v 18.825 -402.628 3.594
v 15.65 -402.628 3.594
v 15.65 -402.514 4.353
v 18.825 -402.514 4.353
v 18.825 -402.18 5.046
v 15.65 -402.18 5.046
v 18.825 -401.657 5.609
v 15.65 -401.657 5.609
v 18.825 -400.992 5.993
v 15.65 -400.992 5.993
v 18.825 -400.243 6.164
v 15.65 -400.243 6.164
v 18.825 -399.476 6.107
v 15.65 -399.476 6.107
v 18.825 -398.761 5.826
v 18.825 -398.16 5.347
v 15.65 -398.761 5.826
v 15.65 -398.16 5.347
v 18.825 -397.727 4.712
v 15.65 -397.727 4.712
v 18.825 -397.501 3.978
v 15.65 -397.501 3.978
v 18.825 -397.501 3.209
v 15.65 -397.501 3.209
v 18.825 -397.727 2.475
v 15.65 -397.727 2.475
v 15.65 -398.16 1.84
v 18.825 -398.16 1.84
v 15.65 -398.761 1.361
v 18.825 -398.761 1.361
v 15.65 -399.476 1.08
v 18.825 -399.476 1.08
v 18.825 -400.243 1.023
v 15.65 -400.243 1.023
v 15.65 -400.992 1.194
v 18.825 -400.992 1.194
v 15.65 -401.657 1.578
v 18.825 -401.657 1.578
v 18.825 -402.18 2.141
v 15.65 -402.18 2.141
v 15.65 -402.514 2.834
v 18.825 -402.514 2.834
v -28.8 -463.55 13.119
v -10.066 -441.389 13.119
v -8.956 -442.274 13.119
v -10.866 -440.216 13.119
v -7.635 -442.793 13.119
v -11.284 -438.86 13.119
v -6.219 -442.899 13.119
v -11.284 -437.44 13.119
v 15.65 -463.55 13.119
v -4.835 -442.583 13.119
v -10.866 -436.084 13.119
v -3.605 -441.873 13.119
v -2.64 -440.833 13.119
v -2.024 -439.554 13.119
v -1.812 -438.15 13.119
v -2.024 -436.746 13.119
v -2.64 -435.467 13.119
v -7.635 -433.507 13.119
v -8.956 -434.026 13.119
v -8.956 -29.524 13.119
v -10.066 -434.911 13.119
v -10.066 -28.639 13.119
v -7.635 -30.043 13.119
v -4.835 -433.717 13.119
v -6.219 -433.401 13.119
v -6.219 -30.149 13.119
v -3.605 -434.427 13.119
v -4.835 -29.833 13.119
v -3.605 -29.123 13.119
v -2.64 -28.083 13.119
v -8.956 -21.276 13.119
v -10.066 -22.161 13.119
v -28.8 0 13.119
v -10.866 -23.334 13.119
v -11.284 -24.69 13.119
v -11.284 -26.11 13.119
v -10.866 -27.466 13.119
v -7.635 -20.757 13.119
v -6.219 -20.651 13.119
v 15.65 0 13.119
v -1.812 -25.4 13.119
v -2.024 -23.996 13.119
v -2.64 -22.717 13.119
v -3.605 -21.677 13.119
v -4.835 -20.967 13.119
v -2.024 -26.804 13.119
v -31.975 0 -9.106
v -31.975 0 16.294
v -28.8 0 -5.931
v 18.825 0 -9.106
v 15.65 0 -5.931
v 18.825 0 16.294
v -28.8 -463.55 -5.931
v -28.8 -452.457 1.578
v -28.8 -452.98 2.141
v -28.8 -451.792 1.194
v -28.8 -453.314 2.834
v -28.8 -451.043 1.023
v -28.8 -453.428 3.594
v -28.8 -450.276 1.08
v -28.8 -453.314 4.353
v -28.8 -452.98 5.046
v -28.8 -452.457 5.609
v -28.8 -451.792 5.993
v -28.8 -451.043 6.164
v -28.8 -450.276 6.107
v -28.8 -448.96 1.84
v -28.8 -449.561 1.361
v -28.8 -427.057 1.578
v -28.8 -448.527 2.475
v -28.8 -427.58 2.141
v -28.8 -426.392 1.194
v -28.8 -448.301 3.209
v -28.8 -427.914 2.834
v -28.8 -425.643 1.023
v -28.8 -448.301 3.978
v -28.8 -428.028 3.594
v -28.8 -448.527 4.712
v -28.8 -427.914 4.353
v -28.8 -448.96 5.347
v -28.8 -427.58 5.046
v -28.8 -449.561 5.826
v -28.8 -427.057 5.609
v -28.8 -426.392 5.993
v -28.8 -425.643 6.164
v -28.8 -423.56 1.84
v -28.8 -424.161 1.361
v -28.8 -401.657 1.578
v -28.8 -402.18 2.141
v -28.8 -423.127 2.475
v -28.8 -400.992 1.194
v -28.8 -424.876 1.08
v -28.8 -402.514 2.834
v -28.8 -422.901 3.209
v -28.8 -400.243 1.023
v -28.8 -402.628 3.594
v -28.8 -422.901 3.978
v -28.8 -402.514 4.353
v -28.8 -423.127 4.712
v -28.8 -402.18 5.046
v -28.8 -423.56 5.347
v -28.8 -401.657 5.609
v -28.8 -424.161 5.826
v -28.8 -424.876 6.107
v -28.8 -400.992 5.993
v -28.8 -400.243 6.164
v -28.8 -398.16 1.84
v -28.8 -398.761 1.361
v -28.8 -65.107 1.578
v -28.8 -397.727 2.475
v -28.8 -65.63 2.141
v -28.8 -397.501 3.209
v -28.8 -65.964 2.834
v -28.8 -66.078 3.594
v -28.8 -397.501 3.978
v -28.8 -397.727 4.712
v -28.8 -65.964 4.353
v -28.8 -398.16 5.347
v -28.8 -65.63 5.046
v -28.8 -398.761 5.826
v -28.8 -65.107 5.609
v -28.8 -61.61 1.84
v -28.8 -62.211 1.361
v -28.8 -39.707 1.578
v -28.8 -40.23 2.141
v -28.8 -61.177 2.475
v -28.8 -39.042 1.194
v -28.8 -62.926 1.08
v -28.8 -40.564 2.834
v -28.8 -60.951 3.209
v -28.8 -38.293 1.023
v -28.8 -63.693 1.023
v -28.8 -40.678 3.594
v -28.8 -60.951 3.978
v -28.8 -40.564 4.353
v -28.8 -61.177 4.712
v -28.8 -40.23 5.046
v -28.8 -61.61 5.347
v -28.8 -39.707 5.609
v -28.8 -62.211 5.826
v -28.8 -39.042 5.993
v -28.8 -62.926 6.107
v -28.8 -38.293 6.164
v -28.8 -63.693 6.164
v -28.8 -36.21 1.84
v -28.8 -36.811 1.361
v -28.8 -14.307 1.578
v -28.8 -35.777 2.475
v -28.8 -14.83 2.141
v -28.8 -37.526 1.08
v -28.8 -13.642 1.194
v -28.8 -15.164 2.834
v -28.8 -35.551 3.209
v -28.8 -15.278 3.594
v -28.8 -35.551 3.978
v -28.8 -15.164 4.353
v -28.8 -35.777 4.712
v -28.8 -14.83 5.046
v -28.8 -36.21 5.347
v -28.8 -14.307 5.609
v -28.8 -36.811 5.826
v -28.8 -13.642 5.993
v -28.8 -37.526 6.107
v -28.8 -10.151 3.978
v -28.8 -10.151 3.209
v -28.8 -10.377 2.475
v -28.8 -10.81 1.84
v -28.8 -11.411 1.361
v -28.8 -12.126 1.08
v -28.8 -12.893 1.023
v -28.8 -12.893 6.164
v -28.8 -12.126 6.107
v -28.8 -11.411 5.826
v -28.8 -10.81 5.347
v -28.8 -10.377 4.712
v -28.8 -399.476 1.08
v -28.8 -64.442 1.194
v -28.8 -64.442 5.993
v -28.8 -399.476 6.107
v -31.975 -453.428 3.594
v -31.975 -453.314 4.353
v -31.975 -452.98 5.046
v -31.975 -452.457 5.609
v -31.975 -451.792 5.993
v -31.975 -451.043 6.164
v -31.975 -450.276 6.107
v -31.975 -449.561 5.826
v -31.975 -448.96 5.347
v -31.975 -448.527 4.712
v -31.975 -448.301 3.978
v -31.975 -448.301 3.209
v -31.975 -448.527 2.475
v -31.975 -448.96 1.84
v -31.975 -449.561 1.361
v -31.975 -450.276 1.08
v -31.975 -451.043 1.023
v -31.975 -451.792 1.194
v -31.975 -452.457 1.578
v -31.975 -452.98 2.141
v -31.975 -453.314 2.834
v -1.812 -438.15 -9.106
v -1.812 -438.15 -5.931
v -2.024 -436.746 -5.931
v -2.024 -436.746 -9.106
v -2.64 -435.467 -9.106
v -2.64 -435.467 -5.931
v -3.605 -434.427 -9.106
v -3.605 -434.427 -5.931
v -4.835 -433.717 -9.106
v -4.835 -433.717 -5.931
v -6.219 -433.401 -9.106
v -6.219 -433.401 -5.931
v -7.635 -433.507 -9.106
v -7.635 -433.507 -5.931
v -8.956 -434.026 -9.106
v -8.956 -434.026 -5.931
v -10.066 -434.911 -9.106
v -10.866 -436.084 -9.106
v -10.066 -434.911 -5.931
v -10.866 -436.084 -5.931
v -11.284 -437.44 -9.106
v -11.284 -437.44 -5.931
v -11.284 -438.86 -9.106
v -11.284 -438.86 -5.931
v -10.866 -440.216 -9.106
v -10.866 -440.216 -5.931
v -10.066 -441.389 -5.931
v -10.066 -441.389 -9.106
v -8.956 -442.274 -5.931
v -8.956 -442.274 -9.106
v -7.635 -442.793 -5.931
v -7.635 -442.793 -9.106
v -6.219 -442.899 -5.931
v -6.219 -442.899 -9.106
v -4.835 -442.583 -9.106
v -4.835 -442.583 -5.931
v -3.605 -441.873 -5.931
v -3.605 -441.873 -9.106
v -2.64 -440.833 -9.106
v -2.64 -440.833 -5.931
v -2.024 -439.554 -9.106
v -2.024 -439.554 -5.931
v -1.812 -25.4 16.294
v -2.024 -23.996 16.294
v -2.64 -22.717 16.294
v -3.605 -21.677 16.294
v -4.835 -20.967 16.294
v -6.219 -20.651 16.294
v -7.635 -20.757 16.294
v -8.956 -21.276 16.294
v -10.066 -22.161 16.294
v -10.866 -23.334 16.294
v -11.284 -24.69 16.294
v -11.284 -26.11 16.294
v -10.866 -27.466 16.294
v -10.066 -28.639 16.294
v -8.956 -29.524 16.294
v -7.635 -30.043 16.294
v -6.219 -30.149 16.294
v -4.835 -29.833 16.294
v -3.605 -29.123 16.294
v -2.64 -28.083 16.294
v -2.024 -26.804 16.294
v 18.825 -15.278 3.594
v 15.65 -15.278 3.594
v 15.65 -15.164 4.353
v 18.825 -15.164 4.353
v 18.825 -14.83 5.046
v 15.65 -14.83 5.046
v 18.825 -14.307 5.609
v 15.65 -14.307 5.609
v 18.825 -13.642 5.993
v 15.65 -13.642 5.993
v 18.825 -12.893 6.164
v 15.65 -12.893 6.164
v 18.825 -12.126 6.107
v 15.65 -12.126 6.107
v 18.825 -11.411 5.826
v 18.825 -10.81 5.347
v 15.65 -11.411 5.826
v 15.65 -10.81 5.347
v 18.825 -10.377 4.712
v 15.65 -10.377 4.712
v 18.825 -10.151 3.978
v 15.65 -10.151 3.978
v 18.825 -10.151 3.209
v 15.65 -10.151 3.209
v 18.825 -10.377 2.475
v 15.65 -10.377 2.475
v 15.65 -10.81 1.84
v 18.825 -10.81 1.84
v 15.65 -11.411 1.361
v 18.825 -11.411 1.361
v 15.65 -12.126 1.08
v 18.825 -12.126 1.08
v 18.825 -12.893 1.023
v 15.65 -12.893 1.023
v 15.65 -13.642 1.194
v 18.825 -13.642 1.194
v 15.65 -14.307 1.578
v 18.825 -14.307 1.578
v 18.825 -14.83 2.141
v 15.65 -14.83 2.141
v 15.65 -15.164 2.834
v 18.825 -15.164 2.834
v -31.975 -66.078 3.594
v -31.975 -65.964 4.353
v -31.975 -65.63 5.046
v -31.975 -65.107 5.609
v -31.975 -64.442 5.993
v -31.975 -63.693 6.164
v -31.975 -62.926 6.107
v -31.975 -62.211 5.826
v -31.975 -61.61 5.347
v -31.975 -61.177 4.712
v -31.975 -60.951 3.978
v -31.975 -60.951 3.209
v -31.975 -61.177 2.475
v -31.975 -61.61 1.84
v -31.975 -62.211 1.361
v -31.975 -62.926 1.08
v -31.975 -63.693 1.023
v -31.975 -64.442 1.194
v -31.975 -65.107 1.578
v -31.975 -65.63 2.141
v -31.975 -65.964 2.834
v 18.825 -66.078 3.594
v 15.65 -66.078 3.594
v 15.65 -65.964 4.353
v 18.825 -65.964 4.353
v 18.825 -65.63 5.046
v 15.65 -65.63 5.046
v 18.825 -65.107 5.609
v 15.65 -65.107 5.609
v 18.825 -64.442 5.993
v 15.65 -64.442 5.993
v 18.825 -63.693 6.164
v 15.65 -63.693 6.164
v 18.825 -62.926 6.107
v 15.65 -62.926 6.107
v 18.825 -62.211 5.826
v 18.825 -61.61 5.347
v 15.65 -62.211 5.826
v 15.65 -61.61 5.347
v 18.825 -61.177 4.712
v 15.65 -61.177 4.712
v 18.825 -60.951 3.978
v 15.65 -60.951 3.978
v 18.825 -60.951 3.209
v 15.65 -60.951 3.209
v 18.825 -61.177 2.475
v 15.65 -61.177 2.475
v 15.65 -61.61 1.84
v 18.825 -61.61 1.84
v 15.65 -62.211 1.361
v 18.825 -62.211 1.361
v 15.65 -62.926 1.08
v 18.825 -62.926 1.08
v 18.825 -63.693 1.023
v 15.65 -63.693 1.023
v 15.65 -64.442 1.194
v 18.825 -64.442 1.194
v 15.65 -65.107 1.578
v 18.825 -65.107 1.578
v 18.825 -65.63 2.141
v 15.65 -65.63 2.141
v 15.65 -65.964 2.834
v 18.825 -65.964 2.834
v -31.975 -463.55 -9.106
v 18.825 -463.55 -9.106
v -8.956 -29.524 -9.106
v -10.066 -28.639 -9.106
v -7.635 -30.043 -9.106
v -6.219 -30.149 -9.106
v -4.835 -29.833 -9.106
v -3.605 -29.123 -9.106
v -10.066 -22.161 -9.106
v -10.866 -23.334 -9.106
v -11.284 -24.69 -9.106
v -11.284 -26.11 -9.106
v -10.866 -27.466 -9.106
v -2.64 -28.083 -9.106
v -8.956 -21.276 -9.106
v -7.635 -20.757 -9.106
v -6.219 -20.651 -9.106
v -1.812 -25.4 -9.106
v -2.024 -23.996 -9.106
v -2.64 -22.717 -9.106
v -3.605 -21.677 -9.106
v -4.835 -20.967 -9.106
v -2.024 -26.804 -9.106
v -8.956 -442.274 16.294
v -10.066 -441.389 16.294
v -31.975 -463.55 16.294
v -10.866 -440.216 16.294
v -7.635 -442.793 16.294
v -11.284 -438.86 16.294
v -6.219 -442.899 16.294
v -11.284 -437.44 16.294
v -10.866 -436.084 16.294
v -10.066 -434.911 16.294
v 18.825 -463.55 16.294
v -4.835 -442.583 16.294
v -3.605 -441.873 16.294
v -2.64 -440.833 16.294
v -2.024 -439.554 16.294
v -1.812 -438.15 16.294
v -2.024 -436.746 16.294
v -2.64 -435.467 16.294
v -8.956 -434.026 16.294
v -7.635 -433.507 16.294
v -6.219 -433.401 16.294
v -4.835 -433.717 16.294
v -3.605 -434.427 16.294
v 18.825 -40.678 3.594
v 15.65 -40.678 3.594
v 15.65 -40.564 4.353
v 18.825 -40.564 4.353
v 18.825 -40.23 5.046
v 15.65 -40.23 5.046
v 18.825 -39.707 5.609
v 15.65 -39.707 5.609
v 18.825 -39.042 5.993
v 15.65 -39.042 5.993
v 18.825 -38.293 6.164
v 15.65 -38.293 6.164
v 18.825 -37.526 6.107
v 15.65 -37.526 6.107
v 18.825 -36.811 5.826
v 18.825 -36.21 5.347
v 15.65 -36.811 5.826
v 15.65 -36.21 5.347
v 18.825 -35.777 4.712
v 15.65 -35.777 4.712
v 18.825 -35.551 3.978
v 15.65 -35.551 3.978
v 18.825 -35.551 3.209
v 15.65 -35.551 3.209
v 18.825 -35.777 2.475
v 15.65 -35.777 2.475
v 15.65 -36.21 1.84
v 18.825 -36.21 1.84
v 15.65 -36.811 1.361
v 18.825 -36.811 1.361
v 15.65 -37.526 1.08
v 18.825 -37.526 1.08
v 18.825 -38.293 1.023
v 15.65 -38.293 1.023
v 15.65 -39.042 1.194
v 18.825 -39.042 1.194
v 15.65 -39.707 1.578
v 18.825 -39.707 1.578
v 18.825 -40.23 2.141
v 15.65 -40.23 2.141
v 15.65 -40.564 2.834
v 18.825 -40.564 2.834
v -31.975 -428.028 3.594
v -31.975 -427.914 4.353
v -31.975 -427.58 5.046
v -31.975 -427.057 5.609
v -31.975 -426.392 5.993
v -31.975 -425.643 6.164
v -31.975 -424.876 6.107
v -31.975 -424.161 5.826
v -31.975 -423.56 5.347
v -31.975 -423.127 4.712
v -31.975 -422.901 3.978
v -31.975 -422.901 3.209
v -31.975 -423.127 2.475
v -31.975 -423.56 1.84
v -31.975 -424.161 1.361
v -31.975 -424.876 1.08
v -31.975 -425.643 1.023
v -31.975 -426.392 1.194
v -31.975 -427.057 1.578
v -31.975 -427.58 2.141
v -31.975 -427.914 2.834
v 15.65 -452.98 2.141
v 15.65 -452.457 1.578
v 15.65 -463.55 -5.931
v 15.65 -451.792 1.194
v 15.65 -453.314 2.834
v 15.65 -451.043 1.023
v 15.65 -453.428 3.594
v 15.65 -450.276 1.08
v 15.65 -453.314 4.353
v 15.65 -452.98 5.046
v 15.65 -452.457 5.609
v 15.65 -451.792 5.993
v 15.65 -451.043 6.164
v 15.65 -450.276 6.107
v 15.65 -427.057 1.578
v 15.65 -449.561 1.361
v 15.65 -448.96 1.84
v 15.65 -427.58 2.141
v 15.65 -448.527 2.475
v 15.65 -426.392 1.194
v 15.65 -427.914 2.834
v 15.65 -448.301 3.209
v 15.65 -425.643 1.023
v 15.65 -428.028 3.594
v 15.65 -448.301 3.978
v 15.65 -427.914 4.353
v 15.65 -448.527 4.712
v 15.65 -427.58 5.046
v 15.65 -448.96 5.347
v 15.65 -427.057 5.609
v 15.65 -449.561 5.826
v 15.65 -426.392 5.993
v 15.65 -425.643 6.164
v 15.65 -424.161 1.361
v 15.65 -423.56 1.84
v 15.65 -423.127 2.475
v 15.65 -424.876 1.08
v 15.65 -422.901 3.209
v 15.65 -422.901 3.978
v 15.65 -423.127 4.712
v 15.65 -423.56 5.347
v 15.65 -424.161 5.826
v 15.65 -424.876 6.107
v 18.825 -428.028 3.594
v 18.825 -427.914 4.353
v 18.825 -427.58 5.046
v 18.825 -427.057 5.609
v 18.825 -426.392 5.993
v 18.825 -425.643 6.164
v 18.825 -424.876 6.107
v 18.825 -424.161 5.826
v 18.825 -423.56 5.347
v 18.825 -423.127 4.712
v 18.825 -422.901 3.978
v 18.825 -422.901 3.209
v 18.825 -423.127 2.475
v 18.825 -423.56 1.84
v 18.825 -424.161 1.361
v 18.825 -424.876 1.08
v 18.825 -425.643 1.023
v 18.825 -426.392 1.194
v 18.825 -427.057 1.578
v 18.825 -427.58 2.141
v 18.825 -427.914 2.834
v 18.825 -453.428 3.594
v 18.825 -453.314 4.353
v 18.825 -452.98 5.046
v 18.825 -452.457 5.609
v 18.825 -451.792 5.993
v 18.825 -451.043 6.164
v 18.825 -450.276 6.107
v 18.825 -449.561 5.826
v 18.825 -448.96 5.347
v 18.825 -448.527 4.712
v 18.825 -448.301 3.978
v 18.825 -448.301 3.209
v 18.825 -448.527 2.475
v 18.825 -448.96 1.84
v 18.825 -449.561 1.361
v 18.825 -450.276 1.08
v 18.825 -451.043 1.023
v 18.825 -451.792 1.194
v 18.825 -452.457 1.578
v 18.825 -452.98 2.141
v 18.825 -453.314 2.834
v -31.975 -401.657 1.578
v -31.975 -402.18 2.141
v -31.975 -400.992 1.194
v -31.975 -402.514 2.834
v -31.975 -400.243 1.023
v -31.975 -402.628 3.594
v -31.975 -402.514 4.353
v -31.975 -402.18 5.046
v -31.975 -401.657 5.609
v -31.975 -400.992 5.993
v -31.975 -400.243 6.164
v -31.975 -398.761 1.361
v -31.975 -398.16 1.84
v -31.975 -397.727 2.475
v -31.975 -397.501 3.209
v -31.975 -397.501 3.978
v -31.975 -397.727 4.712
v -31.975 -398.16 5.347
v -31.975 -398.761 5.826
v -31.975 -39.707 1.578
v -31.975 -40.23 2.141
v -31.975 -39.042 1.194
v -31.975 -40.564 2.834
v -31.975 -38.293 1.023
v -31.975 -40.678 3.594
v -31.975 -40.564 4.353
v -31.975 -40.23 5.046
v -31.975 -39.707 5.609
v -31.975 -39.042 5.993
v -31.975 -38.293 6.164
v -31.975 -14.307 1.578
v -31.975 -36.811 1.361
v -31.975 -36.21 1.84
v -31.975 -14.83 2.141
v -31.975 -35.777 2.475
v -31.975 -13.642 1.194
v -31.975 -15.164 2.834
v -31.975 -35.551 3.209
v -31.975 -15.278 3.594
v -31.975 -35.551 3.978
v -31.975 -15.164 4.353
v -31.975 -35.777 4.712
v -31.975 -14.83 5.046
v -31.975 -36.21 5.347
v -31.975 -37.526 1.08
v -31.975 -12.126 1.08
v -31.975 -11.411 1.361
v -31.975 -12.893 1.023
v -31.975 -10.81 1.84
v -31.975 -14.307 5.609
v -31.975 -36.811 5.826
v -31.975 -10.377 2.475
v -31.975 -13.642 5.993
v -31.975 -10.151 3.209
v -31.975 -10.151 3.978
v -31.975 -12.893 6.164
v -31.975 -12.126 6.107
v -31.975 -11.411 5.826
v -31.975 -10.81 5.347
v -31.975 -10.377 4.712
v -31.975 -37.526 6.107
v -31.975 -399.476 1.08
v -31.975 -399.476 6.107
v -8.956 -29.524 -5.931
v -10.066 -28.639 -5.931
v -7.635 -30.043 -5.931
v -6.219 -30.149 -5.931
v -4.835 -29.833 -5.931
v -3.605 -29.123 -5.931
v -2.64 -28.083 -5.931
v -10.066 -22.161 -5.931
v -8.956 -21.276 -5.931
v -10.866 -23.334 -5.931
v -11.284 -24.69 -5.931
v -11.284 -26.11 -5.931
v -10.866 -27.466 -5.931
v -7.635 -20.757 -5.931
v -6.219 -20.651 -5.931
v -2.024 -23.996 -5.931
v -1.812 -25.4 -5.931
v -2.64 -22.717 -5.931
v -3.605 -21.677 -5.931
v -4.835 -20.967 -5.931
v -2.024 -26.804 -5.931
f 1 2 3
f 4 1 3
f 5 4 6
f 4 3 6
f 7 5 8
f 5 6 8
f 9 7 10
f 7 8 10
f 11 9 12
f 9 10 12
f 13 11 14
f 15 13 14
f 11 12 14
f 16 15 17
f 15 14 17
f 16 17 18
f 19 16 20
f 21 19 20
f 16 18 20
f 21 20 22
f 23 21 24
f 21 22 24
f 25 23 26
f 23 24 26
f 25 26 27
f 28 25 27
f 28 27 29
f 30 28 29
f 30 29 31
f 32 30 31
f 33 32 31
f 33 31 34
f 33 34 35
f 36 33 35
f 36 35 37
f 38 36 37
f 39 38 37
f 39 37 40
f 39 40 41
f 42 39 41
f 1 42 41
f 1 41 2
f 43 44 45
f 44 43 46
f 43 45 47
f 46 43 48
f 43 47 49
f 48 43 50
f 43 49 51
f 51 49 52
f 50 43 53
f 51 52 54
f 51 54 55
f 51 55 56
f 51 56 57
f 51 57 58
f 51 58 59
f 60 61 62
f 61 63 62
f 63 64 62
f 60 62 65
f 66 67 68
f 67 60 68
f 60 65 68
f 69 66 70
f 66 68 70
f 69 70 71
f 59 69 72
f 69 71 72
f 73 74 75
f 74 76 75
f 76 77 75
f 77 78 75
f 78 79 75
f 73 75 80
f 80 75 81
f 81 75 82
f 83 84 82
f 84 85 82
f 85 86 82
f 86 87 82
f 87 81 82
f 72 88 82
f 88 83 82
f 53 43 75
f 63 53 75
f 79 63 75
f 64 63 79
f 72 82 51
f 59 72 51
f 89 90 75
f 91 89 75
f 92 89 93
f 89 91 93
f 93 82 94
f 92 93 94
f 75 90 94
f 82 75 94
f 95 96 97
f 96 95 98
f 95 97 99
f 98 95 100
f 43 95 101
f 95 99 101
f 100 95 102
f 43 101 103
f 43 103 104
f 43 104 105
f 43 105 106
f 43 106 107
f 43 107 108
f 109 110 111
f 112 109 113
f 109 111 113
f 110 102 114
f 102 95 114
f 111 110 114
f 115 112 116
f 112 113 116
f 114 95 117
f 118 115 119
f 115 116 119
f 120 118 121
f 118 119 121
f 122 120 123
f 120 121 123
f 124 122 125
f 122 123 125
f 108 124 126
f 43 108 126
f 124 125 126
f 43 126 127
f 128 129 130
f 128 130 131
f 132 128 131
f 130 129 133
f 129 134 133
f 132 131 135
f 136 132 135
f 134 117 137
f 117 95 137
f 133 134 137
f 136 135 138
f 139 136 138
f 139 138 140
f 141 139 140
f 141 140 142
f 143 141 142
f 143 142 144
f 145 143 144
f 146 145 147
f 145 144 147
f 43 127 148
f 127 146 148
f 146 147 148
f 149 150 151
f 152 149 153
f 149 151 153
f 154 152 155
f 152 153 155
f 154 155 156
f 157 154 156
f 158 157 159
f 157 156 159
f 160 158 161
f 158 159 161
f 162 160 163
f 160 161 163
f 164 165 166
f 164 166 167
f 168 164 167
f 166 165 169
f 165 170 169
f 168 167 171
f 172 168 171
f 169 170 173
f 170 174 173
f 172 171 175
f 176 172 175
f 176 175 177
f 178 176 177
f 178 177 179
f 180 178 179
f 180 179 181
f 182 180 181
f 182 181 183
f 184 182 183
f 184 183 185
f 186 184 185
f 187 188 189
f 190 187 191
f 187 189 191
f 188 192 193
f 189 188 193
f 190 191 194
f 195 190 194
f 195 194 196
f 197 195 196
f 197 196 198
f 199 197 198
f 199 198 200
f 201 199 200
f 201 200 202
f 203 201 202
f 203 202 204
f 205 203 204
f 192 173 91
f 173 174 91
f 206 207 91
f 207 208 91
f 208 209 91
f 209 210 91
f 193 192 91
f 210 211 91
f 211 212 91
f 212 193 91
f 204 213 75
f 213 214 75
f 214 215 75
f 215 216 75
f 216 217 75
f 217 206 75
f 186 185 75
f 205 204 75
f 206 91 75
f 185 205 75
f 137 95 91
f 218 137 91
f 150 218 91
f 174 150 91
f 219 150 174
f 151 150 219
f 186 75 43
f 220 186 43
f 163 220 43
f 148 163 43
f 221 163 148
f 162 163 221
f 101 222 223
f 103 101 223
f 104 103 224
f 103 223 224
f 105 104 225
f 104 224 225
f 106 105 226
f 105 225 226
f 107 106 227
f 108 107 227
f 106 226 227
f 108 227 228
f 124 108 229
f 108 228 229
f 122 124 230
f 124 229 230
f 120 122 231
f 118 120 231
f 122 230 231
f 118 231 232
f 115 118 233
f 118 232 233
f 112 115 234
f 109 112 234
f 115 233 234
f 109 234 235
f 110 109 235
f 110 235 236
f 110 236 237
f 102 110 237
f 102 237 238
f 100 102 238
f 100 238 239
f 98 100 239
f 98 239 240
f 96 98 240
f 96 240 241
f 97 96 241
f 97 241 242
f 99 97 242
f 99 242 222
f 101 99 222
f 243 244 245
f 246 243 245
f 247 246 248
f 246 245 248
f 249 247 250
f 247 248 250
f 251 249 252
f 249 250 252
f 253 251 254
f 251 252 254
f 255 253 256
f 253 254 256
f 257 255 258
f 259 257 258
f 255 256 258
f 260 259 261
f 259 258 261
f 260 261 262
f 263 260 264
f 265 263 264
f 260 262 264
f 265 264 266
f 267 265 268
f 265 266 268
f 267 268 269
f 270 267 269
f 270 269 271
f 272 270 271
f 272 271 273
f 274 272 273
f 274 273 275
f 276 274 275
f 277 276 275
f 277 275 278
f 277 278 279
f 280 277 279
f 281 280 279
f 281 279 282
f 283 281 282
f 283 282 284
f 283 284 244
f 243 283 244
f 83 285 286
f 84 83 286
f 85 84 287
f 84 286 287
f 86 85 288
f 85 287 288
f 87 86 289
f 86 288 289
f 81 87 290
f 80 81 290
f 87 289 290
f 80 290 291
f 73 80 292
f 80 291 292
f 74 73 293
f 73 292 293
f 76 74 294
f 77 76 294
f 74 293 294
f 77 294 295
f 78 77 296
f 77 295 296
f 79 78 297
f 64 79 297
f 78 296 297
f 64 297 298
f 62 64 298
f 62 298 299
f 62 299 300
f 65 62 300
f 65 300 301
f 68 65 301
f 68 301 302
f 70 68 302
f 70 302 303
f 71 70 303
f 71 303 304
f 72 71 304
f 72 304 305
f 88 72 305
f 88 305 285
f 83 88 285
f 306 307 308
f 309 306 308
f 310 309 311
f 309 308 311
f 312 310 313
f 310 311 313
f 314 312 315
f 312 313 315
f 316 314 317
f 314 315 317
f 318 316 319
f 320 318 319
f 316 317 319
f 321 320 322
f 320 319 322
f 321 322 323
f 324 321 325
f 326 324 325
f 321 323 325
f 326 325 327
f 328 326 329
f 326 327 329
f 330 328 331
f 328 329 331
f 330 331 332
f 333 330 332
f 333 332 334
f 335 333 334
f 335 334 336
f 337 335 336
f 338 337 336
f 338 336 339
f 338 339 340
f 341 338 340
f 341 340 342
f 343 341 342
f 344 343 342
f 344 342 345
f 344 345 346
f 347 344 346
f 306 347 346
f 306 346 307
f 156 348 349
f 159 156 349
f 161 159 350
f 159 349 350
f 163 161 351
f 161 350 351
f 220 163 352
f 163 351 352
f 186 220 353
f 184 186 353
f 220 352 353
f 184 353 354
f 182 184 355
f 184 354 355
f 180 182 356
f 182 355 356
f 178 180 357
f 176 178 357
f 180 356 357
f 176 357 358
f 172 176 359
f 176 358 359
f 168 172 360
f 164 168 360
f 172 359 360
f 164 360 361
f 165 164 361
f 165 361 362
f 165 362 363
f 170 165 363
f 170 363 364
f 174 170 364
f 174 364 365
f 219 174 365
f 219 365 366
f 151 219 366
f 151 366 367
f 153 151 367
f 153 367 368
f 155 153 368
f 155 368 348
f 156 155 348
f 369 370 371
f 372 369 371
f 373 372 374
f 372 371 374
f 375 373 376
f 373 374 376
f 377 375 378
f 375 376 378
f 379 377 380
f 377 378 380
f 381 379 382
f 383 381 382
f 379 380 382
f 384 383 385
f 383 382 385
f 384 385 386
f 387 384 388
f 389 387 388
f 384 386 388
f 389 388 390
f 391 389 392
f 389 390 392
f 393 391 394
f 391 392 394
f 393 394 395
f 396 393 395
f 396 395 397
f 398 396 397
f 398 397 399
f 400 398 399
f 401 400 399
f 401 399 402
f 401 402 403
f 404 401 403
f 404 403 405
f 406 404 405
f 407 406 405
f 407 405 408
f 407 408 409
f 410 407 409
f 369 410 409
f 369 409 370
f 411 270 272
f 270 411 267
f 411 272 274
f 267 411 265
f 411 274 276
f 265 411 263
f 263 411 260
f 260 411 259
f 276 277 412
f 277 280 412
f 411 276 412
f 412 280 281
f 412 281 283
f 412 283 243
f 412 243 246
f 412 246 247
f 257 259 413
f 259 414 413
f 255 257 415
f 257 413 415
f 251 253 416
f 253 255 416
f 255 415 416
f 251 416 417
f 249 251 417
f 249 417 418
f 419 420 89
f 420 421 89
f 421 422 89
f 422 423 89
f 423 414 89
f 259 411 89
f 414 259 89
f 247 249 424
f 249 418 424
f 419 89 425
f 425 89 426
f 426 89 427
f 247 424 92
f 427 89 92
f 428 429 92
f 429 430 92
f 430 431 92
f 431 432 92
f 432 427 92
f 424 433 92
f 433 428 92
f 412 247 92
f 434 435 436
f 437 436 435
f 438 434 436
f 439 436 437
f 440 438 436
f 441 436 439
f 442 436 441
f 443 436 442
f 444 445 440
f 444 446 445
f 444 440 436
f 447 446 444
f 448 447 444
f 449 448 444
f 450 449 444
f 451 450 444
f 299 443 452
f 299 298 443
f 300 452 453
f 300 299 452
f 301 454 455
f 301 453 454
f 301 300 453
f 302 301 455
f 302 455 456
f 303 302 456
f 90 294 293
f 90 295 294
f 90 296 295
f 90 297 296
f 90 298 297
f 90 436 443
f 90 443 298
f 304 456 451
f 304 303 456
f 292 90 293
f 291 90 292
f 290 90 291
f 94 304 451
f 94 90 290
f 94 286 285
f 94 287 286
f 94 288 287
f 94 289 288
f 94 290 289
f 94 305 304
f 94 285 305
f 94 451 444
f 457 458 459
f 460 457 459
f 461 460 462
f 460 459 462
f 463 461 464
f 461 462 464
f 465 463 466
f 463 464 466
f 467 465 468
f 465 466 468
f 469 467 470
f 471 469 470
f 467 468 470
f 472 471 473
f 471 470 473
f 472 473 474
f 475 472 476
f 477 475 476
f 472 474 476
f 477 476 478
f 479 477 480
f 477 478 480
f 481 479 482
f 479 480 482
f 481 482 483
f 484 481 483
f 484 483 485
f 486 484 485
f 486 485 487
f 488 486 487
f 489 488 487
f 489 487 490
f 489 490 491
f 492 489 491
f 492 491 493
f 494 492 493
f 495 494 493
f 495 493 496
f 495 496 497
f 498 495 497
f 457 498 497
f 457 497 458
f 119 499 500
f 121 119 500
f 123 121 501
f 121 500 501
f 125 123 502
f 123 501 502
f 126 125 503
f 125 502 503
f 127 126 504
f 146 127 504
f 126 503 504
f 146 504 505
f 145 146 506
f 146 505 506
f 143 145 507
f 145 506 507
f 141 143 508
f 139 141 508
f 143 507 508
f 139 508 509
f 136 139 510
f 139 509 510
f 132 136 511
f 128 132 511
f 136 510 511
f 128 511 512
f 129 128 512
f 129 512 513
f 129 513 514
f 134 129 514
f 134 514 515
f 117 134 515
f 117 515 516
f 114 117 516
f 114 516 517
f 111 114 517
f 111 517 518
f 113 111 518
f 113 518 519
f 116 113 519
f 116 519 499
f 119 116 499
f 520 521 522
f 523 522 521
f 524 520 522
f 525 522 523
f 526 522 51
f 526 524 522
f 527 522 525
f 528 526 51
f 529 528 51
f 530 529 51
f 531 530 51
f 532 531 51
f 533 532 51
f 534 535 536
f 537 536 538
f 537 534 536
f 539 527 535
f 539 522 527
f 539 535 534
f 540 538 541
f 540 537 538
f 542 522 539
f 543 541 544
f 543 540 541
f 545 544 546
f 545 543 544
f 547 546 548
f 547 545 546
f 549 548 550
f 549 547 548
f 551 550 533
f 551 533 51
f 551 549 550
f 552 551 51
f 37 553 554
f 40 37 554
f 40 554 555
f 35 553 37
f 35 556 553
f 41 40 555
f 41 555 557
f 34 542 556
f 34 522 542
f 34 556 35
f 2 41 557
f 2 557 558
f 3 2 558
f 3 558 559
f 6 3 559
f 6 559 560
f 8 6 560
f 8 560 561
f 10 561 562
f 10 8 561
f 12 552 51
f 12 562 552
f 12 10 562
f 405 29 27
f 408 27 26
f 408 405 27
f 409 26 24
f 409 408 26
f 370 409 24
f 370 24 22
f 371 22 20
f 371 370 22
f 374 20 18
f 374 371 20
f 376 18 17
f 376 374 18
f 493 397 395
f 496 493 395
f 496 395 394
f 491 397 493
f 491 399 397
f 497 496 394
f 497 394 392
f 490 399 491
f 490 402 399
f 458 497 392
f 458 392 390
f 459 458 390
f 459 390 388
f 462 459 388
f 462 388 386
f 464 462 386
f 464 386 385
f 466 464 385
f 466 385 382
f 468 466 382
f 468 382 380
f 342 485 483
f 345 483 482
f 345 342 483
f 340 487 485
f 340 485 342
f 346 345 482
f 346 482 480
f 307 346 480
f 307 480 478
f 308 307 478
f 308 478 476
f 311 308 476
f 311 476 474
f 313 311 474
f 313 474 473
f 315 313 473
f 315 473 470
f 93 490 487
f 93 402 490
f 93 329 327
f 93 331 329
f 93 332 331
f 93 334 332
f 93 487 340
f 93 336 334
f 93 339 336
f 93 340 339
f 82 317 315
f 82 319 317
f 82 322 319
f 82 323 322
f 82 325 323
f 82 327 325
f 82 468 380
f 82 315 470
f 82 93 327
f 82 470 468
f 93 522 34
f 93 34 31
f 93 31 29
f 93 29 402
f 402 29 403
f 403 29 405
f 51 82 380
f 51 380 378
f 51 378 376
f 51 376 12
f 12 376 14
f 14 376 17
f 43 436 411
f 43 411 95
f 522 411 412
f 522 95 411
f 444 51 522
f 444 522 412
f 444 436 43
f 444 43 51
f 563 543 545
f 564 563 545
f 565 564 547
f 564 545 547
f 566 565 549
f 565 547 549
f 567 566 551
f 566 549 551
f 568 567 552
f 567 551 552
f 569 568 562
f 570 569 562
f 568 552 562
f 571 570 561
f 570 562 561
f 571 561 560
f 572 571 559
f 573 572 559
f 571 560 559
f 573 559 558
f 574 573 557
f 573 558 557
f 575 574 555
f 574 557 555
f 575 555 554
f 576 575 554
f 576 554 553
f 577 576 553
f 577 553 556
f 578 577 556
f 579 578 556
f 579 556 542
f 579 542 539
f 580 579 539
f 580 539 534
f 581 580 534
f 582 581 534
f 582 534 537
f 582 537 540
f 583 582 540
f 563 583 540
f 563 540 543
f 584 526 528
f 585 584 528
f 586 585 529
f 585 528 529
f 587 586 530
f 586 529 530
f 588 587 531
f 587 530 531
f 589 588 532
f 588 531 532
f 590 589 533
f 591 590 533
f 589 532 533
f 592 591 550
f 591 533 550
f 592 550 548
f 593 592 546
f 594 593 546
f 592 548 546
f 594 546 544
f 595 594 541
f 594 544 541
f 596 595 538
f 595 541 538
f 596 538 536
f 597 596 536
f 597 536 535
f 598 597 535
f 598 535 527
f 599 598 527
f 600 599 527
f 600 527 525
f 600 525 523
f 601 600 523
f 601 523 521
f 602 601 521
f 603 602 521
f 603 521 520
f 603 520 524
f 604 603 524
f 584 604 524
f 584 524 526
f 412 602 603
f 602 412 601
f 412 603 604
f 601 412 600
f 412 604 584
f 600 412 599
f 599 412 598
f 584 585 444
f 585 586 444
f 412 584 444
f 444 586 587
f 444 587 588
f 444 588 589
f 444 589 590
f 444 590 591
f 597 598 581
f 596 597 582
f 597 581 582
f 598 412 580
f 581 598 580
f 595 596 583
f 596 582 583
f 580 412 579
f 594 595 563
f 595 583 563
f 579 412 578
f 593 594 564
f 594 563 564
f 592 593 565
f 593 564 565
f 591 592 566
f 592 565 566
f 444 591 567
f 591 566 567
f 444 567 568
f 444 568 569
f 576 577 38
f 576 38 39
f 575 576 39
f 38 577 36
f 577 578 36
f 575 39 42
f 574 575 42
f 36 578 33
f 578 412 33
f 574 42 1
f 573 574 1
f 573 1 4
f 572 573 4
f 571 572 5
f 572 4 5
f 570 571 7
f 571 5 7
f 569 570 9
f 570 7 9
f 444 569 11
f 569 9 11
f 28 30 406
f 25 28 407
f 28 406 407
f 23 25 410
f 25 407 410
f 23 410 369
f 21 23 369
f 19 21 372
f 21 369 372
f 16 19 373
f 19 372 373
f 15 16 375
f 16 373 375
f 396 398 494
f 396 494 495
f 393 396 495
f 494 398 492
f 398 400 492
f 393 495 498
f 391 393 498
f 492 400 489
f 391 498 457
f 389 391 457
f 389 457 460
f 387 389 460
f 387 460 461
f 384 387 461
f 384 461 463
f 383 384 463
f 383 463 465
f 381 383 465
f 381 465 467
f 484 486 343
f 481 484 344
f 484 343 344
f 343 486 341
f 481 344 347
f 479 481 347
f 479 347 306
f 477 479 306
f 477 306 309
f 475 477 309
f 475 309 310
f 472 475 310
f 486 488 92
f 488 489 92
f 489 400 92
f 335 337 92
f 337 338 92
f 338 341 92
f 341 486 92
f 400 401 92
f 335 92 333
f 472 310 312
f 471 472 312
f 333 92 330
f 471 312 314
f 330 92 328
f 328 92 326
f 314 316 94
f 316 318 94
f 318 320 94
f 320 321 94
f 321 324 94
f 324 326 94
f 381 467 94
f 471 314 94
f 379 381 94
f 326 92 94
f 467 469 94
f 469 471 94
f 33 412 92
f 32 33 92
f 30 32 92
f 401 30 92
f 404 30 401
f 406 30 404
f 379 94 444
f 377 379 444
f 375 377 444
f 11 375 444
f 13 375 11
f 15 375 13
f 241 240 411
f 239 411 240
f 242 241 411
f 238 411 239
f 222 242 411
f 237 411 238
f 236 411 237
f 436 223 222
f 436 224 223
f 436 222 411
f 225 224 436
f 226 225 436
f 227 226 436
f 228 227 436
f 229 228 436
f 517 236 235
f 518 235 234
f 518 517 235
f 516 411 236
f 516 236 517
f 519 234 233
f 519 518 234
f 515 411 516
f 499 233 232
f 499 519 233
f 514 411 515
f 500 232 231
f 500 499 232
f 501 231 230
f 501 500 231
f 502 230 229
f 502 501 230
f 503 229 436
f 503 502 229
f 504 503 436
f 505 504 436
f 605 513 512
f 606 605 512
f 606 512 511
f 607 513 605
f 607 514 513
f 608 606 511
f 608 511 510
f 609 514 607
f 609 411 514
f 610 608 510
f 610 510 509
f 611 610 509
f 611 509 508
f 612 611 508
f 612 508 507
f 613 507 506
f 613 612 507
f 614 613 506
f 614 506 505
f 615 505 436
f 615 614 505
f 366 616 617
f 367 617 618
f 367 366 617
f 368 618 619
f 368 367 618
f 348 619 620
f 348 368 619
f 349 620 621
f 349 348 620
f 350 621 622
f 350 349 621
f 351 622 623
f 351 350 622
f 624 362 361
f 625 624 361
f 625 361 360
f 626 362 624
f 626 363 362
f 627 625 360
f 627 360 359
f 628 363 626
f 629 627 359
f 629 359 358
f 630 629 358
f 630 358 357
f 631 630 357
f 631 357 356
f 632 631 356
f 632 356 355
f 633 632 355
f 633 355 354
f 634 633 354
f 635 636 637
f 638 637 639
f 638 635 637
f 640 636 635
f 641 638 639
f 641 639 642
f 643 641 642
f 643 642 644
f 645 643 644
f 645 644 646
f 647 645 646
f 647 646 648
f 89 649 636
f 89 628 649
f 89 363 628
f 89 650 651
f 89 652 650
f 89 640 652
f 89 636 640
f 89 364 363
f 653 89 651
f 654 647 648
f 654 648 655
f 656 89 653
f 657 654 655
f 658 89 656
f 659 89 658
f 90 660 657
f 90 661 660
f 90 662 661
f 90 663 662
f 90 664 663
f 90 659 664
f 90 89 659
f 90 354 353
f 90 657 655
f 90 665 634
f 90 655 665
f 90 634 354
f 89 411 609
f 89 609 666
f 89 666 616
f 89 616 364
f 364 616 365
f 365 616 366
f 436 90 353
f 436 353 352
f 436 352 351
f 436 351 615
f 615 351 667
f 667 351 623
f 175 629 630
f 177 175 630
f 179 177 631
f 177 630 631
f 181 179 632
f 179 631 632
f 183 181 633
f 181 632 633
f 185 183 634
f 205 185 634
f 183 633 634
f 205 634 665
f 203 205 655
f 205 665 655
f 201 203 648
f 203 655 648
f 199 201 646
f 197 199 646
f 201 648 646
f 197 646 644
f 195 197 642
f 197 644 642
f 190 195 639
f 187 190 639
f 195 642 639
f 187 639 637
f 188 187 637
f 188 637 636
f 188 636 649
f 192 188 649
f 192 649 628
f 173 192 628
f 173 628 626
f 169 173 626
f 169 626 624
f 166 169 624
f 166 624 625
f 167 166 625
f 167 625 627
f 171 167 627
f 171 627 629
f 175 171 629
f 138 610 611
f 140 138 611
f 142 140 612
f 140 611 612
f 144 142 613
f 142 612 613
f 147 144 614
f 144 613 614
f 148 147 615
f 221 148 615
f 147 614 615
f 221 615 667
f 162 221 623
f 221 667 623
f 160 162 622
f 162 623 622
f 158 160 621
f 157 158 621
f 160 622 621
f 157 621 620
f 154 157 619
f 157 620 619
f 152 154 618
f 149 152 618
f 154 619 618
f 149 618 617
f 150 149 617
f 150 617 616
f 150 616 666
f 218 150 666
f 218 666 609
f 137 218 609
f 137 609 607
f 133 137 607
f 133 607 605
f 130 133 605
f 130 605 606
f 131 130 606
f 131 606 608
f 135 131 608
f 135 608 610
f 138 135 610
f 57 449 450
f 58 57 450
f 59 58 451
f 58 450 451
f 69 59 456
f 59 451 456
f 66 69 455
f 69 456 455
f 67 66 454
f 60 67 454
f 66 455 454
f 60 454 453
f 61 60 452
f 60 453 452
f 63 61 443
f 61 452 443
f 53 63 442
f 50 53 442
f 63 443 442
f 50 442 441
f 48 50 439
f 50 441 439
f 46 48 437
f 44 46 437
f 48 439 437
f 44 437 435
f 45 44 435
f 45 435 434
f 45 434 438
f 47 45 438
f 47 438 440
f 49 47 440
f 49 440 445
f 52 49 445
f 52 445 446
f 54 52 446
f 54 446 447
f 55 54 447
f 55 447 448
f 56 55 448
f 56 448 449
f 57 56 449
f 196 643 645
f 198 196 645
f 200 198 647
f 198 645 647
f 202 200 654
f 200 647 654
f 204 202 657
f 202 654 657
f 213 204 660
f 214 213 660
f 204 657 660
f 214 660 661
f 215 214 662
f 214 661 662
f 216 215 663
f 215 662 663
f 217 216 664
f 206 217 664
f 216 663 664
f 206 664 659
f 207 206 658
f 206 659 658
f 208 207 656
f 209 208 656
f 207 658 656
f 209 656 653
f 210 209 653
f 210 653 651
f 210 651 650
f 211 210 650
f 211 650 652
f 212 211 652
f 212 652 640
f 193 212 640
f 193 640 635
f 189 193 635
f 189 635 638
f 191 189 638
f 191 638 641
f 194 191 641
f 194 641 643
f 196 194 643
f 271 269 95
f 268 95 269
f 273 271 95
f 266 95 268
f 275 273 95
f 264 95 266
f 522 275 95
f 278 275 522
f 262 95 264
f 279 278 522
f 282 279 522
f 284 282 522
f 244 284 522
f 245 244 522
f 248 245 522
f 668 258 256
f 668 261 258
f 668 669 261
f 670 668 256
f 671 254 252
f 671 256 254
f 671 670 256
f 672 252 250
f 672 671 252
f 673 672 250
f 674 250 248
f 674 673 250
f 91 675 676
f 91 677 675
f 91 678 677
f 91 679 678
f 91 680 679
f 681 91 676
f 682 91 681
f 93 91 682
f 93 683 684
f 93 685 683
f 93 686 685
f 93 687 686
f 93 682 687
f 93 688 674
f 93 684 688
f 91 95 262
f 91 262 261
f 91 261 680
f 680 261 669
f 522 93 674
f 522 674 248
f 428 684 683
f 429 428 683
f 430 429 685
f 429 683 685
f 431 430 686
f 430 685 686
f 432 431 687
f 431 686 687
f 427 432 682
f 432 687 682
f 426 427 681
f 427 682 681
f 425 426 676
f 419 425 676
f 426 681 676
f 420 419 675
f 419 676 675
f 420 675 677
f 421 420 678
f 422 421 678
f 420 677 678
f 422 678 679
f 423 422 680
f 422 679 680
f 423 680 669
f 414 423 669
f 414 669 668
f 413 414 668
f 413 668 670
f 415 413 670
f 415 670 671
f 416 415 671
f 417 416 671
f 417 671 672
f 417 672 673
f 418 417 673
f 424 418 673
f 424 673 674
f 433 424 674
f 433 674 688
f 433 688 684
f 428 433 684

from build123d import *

# Parameters (mm, degrees)
F0_W     = 50.8
F0_H     = 25.4
F0_W_2   = 44.45
F0_H_2   = 19.05
F1_DEPTH = 463.55
F2_R     = 2.5781
F3_DEPTH = 50.801
F4_R     = 4.7625
F5_DEPTH = 25.401


with BuildPart() as f1:
    # F0 (on Front) → F1 (new body)
    with BuildSketch(Plane.XZ):
        with Locations((-6.57482, 3.593568)):
            Rectangle(F0_W, F0_H)
        with Locations((-6.57482, 3.593568)):
            Rectangle(F0_W_2, F0_H_2, mode=Mode.SUBTRACT)
    extrude(amount=F1_DEPTH)

    # F2 (on face) → F3 (cut, through all)
    with BuildSketch(Plane(origin=(-31.97482, 0, 0), x_dir=(0, -1, 0), z_dir=(-1, 0, 0))):
        with Locations((12.7, 3.593568)):
            Circle(F2_R)
        with Locations((38.1, 3.593568)):
            Circle(F2_R)
        with Locations((63.5, 3.593568)):
            Circle(F2_R)
        with Locations((400.05, 3.593568)):
            Circle(F2_R)
        with Locations((425.45, 3.593568)):
            Circle(F2_R)
        with Locations((450.85, 3.593568)):
            Circle(F2_R)
    extrude(amount=-F3_DEPTH, mode=Mode.SUBTRACT)

    # F4 (on face) → F5 (cut, through all)
    with BuildSketch(Plane.XY.offset(16.293568)):
        with Locations((-6.57482, -438.15)):
            Circle(F4_R)
        with Locations((-6.57482, -25.4)):
            Circle(F4_R)
    extrude(amount=-F5_DEPTH, mode=Mode.SUBTRACT)


solid = f1.part
